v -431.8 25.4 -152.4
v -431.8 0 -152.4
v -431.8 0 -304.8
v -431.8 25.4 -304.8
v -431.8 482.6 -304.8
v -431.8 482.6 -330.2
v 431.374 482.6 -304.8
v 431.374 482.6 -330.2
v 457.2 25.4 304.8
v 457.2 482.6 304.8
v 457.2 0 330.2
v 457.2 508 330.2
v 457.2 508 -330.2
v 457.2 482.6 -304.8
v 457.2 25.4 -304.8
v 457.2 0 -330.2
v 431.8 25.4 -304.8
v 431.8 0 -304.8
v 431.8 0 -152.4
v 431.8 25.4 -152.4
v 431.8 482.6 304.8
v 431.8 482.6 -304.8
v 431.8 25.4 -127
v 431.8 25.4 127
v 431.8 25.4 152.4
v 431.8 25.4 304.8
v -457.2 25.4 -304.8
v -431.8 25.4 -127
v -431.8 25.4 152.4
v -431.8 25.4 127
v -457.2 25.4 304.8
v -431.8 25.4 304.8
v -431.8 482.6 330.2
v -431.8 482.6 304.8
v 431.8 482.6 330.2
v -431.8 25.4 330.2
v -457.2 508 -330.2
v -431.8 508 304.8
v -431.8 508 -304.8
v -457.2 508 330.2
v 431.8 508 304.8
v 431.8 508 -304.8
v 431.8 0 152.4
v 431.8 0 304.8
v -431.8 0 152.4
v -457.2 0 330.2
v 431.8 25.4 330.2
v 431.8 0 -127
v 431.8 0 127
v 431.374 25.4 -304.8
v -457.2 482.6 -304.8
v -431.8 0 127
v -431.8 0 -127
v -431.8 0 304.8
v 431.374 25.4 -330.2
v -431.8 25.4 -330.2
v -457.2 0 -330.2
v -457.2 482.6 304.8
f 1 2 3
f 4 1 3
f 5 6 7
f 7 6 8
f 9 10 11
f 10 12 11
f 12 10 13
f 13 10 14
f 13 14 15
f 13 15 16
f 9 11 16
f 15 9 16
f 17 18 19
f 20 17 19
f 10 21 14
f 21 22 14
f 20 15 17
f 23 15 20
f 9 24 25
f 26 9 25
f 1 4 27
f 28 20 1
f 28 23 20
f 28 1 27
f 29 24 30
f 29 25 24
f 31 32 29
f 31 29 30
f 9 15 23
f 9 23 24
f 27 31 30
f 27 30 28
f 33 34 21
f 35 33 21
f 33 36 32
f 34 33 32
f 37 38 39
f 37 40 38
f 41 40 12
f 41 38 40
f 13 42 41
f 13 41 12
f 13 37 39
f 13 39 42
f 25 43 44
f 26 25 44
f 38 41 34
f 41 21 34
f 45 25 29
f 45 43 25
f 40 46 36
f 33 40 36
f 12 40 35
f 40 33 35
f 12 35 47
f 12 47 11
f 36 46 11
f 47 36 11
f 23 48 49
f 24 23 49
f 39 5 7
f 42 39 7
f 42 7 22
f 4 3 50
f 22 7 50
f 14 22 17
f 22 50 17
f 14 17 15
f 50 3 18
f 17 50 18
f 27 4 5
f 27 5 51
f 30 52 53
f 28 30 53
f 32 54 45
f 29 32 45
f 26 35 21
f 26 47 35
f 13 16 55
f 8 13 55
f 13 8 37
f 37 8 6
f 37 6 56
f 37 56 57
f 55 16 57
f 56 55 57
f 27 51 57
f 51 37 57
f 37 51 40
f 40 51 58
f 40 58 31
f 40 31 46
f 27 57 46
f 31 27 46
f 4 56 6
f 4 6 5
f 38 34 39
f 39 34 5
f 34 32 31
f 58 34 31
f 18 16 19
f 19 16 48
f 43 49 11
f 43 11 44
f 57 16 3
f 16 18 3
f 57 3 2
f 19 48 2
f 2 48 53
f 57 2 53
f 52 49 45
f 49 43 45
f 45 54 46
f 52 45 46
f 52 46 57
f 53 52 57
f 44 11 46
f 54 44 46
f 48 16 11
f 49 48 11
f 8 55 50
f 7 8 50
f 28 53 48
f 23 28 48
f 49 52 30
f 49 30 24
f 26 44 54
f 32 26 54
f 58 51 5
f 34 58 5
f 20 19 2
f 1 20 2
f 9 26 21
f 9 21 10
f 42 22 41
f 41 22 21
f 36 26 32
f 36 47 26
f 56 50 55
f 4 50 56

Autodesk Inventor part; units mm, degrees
ref_plane "YZ Plane" through (0, 0, 0) normal (1, 0, 0) x (0, 1, 0)
ref_plane "XZ Plane" through (0, 0, 0) normal (0, 1, 0) x (-1, 0, 0)
ref_plane "XY Plane" through (0, 0, 0) normal (0, 0, 1) x (1, 0, 0)
sketch "Sketch1" plane through (0, 0, 0) normal (0, 1, 0) x (-1, 0, 0)
  line L0 (457.2, 330.2) -> (-457.2, 330.2)
  line L1 (-457.2, 330.2) -> (-457.2, -330.2)
  line L2 (-457.2, -330.2) -> (457.2, -330.2)
  line L3 (457.2, -330.2) -> (457.2, 330.2)
  line L4 (457.2, 330.2) -> (-457.2, -330.2) construction
  line L5 (-457.2, 330.2) -> (457.2, -330.2) construction
  line L6 (-431.8, -304.8) -> (-431.8, 304.8)
  line L7 (-431.8, 304.8) -> (431.8, 304.8)
  line L8 (431.8, 304.8) -> (431.8, -304.8)
  line L9 (431.8, -304.8) -> (-431.8, -304.8)
  line L10 (-431.8, 152.4) -> (431.8, 152.4)
  line L11 (431.8, 152.4) -> (431.8, 127)
  line L12 (431.8, 127) -> (-431.8, 127)
  line L13 (-431.8, 127) -> (-431.8, 152.4)
  line L14 (431.8, -127) -> (-431.8, -127)
  line L15 (-431.8, -127) -> (-431.8, -152.4)
  line L16 (-431.8, -152.4) -> (431.8, -152.4)
  line L17 (431.8, -152.4) -> (431.8, -127)
  point P0 (0, 0)
  point P1 (0, -152.4)
  dimension "d0" = 914.4
  dimension "d1" = 660.4
  dimension "d2" = 25.4
  dimension "d3" = 25.4
  dimension "d4" = 25.4
  dimension "d5" = 152.4
  dimension "d6" = 152.4
extrude "Extrusion1" add sketch "Sketch1" along normal blind 25.4 contours L3 L2 L1 L0 | L6 L14 L8 L16 | L6 L10 L8 L12
sketch "Sketch2" plane through (0, 25.4, 0) normal (0, 1, 0) x (1, 0, 0)
  line L0 (-457.2, 330.2) -> (-457.2, -330.2) projected
  line L1 (431.8, -304.8) -> (-431.8, -304.8) projected
  line L2 (-457.2, -330.2) -> (-431.8, -330.2)
  line L3 (-431.8, -330.2) -> (-431.8, -304.8)
  line L4 (-431.8, -304.8) -> (-457.2, -304.8)
  line L5 (-457.2, -304.8) -> (-457.2, -330.2)
  line L6 (457.2, 330.2) -> (-457.2, 330.2) projected
  line L7 (-431.8, 304.8) -> (431.8, 304.8) projected
  line L8 (-457.2, 330.2) -> (-431.8, 330.2)
  line L9 (-431.8, 330.2) -> (-431.8, 304.8)
  line L10 (-431.8, 304.8) -> (-457.2, 304.8)
  line L11 (-457.2, 304.8) -> (-457.2, 330.2)
  line L12 (457.2, -330.2) -> (457.2, 330.2) projected
  line L13 (457.2, 330.2) -> (431.3742, 330.2)
  line L14 (431.3742, 330.2) -> (431.3742, 304.8)
  line L15 (431.3742, 304.8) -> (457.2, 304.8)
  line L16 (457.2, 304.8) -> (457.2, 330.2)
  line L17 (457.2, -330.2) -> (431.8, -330.2)
  line L18 (431.8, -330.2) -> (431.8, -304.8)
  line L19 (431.8, -304.8) -> (457.2, -304.8)
  line L20 (457.2, -304.8) -> (457.2, -330.2)
  point P0 (0, 0)
extrude "Extrusion2" add sketch "Sketch2" along normal blind 457.2 contours L6 L9 L10 L0 | L4 L3 L2 L0 | L6 L12 L15 L7 L14 | L19 L12 L17 L18
sketch "Sketch3" plane through (0, 482.6, 0) normal (0, 1, 0) x (1, 0, 0)
  line L0 (431.8, -127) -> (-431.8, -127)
  line L1 (-431.8, -127) -> (-431.8, 127)
  line L2 (-431.8, 127) -> (431.8, 127)
  line L3 (431.8, 127) -> (431.8, -127)
  line L4 (457.2, 304.8) -> (431.8, 304.8)
  line L5 (431.8, 304.8) -> (431.8, 152.4)
  line L6 (431.8, 152.4) -> (-431.8, 152.4)
  line L7 (-431.8, 152.4) -> (-431.8, 304.8)
  line L8 (-431.8, 304.8) -> (-457.2, 304.8)
  line L9 (-457.2, 304.8) -> (-457.2, -304.8)
  line L10 (-457.2, -304.8) -> (-431.8, -304.8)
  line L11 (-431.8, -304.8) -> (-431.8, -152.4)
  line L12 (-431.8, -152.4) -> (431.8, -152.4)
  line L13 (431.8, -152.4) -> (431.8, -304.8)
  line L14 (431.8, -304.8) -> (457.2, -304.8)
  line L15 (457.2, -304.8) -> (457.2, 304.8)
  line L16 (431.3742, 304.8) -> (431.3742, 330.2)
  line L17 (431.3742, 330.2) -> (-431.8, 330.2)
  line L18 (-431.8, 330.2) -> (-431.8, 304.8)
  line L19 (-431.8, 304.8) -> (431.3742, 304.8)
  line L20 (431.8, -330.2) -> (431.8, -304.8)
  line L21 (431.8, -304.8) -> (-431.8, -304.8)
  line L22 (-431.8, -304.8) -> (-431.8, -330.2)
  line L23 (-431.8, -330.2) -> (431.8, -330.2)
  line L24 (-431.8, -330.2) -> (-431.8, -304.8)
  line L25 (-431.8, -304.8) -> (-457.2, -304.8)
  line L26 (-457.2, -304.8) -> (-457.2, -330.2)
  line L27 (-457.2, -330.2) -> (-431.8, -330.2)
  line L28 (-431.8, 304.8) -> (-431.8, 330.2)
  line L29 (-431.8, 330.2) -> (-457.2, 330.2)
  line L30 (-457.2, 330.2) -> (-457.2, 304.8)
  line L31 (-457.2, 304.8) -> (-431.8, 304.8)
  line L32 (457.2, 304.8) -> (457.2, 330.2)
  line L33 (457.2, 330.2) -> (431.3742, 330.2)
  line L34 (431.3742, 330.2) -> (431.3742, 304.8)
  line L35 (431.3742, 304.8) -> (457.2, 304.8)
  line L36 (457.2, -304.8) -> (431.8, -304.8)
  line L37 (431.8, -330.2) -> (457.2, -330.2)
  line L38 (457.2, -330.2) -> (457.2, -304.8)
  line L39 (457.2, -304.8) -> (431.8, -304.8)
  line L40 (431.8, -304.8) -> (431.8, -330.2)
  line L41 (431.8, -152.4) -> (431.8, -304.8)
  line L42 (431.8, -152.4) -> (431.8, 152.4)
  line L43 (431.8, 127) -> (431.8, -127)
  line L44 (-431.8, -152.4) -> (-431.8, 152.4)
  point P0 (0, 0)
  point P1 (431.8, 127)
extrude "Extrusion3" add sketch "Sketch3" along normal blind 25.4 contours L3 L42 L5 L4 L15 L14 L13 | L44 L11 L10 L9 L8 L7 L1 | L14 L38 L37 L20 | L20 L23 L22 L21 | L22 L27 L26 L10 | L35 L16 L33 L32 L4 | L8 L30 L29 L18 | L18 L17 L16 L19
equation "\"d6\" = d5"
properties part number "Chassis"
